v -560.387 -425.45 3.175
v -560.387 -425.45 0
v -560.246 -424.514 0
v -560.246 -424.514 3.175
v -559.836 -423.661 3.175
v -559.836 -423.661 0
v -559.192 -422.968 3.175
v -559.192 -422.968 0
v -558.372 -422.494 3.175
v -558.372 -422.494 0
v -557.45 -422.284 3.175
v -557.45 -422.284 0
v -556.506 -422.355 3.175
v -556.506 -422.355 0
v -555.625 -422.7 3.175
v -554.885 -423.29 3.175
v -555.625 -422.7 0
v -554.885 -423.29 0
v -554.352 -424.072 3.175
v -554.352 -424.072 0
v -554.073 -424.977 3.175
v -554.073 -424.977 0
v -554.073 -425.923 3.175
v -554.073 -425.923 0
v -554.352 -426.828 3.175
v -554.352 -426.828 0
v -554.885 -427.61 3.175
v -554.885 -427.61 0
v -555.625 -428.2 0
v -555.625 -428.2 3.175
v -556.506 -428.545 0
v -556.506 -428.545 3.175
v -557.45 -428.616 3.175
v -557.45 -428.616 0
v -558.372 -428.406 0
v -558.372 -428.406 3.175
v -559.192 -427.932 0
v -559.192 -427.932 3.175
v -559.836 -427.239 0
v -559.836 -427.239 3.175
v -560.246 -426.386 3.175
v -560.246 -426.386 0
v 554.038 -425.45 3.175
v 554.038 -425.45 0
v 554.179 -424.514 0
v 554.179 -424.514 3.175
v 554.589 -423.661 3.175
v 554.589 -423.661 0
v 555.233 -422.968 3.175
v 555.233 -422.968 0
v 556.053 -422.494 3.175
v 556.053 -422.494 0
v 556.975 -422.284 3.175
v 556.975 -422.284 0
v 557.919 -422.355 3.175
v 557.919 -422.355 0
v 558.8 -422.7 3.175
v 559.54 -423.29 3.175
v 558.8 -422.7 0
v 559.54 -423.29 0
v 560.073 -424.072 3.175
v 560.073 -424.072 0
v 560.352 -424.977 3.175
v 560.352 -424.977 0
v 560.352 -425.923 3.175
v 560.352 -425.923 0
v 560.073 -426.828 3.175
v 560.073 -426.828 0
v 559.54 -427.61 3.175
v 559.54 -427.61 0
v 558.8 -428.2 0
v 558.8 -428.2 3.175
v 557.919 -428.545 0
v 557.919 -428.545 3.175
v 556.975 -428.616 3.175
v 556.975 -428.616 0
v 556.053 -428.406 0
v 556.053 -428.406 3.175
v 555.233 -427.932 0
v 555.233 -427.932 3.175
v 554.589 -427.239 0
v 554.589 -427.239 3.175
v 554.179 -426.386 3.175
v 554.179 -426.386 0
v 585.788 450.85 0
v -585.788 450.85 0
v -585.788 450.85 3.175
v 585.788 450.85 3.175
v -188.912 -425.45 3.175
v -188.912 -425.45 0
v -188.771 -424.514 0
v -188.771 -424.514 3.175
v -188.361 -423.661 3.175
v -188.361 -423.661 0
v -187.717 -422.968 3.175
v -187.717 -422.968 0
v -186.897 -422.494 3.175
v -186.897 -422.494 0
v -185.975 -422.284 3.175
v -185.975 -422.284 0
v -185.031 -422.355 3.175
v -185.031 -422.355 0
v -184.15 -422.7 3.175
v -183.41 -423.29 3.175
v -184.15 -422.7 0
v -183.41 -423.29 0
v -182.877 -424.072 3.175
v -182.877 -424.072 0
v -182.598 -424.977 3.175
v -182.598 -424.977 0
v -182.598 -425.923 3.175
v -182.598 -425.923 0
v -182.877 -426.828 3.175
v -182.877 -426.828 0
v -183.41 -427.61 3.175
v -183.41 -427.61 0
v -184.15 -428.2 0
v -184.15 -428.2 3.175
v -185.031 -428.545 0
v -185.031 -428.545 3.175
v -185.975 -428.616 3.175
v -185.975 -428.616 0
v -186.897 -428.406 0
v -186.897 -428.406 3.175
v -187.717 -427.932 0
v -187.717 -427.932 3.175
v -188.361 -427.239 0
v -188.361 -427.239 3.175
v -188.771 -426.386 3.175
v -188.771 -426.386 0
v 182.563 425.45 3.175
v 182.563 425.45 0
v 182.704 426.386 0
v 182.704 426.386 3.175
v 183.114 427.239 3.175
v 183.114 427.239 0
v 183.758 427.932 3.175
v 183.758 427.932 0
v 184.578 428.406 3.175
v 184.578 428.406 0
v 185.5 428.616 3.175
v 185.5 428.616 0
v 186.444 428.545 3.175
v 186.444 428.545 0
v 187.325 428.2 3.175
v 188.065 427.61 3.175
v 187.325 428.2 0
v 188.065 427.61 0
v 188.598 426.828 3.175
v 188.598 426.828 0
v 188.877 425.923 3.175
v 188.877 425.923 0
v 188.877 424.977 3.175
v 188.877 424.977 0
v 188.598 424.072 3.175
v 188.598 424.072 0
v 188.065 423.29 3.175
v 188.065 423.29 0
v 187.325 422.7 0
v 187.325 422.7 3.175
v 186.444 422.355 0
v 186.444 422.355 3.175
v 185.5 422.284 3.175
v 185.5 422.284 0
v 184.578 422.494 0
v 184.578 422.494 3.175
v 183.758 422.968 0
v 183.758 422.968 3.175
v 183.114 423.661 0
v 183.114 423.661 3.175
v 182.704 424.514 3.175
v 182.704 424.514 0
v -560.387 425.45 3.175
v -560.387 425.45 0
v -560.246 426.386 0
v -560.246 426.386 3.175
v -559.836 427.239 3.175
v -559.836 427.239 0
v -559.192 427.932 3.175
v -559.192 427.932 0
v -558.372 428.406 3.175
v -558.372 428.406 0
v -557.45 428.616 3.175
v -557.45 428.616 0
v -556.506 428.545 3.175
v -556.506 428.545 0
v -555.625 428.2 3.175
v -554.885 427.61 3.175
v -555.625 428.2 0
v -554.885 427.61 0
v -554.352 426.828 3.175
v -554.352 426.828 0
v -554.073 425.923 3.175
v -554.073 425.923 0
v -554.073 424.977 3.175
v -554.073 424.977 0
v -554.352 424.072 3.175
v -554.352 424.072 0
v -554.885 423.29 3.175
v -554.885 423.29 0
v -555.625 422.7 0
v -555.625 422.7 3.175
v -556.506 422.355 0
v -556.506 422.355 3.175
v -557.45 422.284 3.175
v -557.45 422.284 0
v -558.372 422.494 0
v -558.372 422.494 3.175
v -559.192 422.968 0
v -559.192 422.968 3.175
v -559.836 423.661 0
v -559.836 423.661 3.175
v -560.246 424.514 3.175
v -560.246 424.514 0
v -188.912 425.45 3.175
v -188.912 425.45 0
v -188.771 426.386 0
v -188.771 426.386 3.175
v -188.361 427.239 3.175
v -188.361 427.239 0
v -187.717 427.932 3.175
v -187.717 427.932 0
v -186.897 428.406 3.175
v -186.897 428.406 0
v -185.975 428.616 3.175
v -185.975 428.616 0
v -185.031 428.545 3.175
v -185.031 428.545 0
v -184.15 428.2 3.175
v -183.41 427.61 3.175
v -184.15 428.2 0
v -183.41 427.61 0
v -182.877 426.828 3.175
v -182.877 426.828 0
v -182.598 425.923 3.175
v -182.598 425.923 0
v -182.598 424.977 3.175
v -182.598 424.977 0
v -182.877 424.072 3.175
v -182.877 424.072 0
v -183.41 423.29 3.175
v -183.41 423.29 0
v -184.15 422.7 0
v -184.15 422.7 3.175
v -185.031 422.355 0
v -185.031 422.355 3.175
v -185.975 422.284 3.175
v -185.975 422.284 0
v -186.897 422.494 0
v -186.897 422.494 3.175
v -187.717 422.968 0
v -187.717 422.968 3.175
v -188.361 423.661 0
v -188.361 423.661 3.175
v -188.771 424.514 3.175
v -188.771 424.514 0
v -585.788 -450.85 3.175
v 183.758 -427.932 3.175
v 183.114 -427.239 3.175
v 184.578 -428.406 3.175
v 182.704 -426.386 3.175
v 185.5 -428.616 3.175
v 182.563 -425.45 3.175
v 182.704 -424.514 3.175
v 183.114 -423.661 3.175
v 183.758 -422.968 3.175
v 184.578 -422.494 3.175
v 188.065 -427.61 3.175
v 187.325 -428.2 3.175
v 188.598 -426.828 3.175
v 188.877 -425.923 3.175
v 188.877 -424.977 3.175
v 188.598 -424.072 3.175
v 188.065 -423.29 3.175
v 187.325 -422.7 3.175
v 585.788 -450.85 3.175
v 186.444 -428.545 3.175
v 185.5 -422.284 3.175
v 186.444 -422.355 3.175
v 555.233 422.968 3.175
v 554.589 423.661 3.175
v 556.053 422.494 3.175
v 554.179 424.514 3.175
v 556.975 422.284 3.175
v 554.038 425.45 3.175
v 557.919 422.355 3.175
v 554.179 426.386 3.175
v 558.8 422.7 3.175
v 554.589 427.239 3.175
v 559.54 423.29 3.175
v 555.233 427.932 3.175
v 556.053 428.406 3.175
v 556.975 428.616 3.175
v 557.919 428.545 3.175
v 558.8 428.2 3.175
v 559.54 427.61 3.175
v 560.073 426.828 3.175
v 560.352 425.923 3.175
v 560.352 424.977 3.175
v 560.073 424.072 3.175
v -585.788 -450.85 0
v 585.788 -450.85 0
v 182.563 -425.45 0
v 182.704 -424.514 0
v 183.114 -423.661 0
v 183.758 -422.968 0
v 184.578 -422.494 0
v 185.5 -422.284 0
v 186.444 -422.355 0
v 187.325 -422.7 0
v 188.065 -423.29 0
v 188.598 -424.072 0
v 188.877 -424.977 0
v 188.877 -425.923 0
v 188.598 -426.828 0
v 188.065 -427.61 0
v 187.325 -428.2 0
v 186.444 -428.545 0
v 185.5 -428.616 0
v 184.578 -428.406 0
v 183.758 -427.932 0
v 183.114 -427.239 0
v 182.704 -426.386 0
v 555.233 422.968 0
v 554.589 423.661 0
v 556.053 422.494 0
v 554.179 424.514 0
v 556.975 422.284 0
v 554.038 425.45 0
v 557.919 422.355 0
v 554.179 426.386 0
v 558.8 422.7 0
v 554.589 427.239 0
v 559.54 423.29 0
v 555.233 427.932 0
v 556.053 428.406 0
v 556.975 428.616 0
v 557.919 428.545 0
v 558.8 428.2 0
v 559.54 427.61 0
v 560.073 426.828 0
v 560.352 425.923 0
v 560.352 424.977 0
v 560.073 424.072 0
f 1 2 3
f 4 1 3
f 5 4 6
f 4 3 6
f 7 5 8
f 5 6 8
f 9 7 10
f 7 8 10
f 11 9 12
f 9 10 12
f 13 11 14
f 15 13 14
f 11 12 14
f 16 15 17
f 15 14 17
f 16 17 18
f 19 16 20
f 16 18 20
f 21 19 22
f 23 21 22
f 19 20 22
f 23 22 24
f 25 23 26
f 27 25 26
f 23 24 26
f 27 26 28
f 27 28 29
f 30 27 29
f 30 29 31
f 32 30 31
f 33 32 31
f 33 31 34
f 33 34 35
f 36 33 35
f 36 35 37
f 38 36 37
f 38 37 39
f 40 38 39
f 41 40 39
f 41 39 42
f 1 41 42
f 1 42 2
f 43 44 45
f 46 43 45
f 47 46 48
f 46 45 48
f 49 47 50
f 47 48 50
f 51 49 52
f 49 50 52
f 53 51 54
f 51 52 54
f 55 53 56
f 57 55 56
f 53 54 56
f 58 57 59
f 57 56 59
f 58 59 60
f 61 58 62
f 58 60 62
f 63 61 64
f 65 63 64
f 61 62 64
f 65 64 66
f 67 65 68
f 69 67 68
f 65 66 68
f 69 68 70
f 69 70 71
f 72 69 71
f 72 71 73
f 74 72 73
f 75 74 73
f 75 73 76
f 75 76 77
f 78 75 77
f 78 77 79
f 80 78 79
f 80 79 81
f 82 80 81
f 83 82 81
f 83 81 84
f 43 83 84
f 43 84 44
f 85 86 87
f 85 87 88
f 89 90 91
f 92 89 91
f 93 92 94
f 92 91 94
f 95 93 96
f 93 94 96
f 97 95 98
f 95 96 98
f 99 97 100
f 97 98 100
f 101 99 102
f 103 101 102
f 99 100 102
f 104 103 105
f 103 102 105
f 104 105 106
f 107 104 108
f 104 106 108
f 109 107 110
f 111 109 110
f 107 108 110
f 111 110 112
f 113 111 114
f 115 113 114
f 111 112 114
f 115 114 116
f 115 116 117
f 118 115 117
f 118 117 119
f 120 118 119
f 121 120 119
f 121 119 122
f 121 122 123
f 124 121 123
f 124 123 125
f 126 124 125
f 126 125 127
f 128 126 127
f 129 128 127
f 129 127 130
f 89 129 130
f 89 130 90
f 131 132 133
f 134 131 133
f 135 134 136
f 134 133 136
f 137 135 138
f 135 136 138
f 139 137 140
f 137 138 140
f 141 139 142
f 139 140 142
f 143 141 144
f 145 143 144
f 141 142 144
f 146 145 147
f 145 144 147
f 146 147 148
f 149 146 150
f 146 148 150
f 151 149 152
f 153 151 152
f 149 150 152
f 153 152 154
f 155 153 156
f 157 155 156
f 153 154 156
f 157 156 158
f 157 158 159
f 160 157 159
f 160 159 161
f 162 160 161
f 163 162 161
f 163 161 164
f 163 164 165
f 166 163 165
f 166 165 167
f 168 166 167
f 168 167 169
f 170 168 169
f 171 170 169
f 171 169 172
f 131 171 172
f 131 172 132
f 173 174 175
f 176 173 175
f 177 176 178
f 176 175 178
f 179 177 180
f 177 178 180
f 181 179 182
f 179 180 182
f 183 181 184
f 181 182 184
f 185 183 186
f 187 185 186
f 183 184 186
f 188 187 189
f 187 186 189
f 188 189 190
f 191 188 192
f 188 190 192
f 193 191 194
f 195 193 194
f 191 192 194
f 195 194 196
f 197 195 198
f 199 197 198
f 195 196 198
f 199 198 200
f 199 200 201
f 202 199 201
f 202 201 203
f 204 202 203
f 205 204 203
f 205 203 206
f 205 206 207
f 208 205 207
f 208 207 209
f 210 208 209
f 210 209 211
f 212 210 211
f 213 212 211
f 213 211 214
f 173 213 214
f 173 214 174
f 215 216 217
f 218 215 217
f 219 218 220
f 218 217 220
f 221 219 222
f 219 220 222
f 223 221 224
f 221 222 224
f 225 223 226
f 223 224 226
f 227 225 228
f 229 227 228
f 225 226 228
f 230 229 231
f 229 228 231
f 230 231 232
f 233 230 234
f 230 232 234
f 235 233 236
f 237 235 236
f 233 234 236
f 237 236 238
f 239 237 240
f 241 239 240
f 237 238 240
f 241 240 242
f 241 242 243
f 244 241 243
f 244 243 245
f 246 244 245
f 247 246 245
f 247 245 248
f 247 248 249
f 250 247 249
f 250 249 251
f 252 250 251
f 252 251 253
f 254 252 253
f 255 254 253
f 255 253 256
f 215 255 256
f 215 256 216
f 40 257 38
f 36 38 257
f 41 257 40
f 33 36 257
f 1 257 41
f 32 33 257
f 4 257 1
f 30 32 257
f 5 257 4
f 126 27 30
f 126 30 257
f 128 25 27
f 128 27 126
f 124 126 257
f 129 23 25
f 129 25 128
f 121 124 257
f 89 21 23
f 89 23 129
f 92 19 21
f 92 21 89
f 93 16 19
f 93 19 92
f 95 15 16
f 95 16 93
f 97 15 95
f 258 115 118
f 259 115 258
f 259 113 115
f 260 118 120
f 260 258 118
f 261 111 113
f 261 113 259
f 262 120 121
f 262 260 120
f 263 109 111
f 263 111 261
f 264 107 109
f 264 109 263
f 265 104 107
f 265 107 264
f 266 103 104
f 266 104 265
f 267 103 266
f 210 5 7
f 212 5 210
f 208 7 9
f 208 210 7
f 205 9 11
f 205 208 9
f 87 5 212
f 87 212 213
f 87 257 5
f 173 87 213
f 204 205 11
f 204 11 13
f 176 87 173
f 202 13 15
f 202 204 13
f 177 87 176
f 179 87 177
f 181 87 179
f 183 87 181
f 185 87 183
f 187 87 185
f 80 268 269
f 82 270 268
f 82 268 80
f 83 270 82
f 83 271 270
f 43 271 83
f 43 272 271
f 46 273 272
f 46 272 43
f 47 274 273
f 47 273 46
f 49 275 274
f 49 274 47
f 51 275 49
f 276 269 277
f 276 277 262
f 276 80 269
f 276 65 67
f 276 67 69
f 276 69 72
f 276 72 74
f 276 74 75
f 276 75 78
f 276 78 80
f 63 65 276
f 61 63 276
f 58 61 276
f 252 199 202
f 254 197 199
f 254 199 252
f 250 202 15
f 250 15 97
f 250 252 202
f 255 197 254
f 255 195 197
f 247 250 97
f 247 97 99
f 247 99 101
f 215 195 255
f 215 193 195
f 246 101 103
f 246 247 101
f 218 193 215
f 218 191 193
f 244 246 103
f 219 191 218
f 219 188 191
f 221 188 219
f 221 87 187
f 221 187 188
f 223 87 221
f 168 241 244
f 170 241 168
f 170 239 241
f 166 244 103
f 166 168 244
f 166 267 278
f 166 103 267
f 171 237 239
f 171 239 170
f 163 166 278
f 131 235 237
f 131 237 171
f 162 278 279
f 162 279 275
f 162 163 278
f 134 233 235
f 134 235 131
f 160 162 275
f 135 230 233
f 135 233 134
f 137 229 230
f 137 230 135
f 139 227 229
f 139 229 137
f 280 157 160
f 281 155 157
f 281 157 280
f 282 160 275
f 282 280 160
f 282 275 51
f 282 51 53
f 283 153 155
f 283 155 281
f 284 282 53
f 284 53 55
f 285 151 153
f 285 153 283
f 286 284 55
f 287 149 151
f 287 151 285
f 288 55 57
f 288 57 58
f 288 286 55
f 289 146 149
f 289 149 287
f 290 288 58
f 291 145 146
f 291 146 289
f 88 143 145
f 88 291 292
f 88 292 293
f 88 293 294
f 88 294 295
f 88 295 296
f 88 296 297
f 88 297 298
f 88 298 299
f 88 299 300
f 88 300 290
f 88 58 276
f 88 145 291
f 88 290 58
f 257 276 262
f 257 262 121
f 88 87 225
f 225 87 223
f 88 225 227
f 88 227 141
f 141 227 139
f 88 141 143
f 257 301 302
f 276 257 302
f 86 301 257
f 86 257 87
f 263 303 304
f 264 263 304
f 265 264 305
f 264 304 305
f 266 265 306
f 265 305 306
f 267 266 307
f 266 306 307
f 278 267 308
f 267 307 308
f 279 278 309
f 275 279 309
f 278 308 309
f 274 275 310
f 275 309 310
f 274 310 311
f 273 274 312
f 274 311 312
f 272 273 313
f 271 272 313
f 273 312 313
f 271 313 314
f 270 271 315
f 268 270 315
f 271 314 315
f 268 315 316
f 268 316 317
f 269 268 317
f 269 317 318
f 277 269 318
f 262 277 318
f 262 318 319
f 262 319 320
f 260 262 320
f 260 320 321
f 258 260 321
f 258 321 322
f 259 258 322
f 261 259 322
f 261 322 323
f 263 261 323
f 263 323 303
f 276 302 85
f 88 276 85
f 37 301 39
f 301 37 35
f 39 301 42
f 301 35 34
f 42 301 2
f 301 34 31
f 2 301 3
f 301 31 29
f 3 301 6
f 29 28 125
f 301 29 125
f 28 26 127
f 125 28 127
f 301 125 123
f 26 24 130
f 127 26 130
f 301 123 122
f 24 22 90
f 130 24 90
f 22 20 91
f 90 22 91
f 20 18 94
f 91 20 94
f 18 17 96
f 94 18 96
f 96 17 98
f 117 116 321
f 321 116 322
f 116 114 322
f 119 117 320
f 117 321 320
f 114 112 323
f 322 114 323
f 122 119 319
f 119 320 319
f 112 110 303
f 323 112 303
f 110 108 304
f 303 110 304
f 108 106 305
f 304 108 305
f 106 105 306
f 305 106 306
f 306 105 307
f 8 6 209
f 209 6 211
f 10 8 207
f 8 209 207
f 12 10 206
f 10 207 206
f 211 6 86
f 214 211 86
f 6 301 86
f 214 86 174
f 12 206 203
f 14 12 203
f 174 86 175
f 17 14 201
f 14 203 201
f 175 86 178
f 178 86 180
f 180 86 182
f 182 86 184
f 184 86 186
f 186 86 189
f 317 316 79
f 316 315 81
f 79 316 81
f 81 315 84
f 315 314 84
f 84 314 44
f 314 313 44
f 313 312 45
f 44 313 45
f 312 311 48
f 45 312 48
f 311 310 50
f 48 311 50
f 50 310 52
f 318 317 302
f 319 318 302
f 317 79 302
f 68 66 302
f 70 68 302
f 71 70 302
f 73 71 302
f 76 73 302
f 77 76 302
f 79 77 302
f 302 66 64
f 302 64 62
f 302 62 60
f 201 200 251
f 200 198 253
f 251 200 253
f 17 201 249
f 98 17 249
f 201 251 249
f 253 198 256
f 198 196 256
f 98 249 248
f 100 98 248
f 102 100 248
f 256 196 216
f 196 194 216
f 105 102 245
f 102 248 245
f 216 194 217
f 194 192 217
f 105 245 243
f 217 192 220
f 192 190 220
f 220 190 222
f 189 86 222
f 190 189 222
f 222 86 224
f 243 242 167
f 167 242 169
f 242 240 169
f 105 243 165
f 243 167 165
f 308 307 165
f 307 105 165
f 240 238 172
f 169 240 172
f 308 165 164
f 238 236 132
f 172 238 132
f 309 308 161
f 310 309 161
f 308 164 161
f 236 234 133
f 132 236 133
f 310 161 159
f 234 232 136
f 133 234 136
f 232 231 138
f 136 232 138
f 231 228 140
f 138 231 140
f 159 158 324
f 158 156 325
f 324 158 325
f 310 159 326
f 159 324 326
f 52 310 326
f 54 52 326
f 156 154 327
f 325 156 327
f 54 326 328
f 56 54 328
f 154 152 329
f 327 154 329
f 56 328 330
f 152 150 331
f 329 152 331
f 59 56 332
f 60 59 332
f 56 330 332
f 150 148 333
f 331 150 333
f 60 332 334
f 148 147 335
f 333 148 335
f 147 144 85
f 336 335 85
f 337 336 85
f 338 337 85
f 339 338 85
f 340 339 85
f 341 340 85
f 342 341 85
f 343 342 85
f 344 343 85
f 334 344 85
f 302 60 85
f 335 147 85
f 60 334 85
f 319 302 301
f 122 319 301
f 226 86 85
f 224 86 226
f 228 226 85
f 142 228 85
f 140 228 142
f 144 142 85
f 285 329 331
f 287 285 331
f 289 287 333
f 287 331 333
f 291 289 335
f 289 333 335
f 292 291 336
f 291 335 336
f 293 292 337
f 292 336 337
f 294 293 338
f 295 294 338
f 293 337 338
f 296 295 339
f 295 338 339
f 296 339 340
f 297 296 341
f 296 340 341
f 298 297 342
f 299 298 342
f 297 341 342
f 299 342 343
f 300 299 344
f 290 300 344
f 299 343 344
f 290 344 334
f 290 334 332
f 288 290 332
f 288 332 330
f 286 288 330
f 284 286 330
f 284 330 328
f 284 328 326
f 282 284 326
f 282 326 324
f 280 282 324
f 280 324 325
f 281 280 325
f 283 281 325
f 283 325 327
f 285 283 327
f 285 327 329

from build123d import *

# Parameters (mm, degrees)
SKETCH1_W                   = 1171.575
SKETCH1_H                   = 901.7
BOSS_EXTRUDE1_DEPTH         = 3.175
F_1_4_0_25_DIAMETER_HOLE1_D = 6.35
LPATTERN1_COUNT             = 4
LPATTERN1_PITCH             = 371.475
LPATTERN1_COUNT_DIR2        = 2
LPATTERN1_PITCH_DIR2        = 850.9


with BuildPart() as part:
    # Sketch1 → Boss-Extrude1 (new body)
    with BuildSketch(Plane.XY):
        Rectangle(SKETCH1_W, SKETCH1_H)
    extrude(amount=BOSS_EXTRUDE1_DEPTH)

    # 1/4 (0.25) Diameter Hole1 (through all)
    with Locations(Plane.XY.offset(3.175)):
        with Locations((-557.2125, 425.45)):
            f_1_4_0_25_diameter_hole1 = Hole(F_1_4_0_25_DIAMETER_HOLE1_D / 2)

    # LPattern1: 1_4 _0.25_ Diameter Hole1 4 × 2
    with Locations(*[(i * LPATTERN1_PITCH, -j * LPATTERN1_PITCH_DIR2, 0) for i in range(LPATTERN1_COUNT) for j in range(LPATTERN1_COUNT_DIR2) if (i, j) != (0, 0)]):
        add(f_1_4_0_25_diameter_hole1, mode=Mode.SUBTRACT)


solid = part.part
